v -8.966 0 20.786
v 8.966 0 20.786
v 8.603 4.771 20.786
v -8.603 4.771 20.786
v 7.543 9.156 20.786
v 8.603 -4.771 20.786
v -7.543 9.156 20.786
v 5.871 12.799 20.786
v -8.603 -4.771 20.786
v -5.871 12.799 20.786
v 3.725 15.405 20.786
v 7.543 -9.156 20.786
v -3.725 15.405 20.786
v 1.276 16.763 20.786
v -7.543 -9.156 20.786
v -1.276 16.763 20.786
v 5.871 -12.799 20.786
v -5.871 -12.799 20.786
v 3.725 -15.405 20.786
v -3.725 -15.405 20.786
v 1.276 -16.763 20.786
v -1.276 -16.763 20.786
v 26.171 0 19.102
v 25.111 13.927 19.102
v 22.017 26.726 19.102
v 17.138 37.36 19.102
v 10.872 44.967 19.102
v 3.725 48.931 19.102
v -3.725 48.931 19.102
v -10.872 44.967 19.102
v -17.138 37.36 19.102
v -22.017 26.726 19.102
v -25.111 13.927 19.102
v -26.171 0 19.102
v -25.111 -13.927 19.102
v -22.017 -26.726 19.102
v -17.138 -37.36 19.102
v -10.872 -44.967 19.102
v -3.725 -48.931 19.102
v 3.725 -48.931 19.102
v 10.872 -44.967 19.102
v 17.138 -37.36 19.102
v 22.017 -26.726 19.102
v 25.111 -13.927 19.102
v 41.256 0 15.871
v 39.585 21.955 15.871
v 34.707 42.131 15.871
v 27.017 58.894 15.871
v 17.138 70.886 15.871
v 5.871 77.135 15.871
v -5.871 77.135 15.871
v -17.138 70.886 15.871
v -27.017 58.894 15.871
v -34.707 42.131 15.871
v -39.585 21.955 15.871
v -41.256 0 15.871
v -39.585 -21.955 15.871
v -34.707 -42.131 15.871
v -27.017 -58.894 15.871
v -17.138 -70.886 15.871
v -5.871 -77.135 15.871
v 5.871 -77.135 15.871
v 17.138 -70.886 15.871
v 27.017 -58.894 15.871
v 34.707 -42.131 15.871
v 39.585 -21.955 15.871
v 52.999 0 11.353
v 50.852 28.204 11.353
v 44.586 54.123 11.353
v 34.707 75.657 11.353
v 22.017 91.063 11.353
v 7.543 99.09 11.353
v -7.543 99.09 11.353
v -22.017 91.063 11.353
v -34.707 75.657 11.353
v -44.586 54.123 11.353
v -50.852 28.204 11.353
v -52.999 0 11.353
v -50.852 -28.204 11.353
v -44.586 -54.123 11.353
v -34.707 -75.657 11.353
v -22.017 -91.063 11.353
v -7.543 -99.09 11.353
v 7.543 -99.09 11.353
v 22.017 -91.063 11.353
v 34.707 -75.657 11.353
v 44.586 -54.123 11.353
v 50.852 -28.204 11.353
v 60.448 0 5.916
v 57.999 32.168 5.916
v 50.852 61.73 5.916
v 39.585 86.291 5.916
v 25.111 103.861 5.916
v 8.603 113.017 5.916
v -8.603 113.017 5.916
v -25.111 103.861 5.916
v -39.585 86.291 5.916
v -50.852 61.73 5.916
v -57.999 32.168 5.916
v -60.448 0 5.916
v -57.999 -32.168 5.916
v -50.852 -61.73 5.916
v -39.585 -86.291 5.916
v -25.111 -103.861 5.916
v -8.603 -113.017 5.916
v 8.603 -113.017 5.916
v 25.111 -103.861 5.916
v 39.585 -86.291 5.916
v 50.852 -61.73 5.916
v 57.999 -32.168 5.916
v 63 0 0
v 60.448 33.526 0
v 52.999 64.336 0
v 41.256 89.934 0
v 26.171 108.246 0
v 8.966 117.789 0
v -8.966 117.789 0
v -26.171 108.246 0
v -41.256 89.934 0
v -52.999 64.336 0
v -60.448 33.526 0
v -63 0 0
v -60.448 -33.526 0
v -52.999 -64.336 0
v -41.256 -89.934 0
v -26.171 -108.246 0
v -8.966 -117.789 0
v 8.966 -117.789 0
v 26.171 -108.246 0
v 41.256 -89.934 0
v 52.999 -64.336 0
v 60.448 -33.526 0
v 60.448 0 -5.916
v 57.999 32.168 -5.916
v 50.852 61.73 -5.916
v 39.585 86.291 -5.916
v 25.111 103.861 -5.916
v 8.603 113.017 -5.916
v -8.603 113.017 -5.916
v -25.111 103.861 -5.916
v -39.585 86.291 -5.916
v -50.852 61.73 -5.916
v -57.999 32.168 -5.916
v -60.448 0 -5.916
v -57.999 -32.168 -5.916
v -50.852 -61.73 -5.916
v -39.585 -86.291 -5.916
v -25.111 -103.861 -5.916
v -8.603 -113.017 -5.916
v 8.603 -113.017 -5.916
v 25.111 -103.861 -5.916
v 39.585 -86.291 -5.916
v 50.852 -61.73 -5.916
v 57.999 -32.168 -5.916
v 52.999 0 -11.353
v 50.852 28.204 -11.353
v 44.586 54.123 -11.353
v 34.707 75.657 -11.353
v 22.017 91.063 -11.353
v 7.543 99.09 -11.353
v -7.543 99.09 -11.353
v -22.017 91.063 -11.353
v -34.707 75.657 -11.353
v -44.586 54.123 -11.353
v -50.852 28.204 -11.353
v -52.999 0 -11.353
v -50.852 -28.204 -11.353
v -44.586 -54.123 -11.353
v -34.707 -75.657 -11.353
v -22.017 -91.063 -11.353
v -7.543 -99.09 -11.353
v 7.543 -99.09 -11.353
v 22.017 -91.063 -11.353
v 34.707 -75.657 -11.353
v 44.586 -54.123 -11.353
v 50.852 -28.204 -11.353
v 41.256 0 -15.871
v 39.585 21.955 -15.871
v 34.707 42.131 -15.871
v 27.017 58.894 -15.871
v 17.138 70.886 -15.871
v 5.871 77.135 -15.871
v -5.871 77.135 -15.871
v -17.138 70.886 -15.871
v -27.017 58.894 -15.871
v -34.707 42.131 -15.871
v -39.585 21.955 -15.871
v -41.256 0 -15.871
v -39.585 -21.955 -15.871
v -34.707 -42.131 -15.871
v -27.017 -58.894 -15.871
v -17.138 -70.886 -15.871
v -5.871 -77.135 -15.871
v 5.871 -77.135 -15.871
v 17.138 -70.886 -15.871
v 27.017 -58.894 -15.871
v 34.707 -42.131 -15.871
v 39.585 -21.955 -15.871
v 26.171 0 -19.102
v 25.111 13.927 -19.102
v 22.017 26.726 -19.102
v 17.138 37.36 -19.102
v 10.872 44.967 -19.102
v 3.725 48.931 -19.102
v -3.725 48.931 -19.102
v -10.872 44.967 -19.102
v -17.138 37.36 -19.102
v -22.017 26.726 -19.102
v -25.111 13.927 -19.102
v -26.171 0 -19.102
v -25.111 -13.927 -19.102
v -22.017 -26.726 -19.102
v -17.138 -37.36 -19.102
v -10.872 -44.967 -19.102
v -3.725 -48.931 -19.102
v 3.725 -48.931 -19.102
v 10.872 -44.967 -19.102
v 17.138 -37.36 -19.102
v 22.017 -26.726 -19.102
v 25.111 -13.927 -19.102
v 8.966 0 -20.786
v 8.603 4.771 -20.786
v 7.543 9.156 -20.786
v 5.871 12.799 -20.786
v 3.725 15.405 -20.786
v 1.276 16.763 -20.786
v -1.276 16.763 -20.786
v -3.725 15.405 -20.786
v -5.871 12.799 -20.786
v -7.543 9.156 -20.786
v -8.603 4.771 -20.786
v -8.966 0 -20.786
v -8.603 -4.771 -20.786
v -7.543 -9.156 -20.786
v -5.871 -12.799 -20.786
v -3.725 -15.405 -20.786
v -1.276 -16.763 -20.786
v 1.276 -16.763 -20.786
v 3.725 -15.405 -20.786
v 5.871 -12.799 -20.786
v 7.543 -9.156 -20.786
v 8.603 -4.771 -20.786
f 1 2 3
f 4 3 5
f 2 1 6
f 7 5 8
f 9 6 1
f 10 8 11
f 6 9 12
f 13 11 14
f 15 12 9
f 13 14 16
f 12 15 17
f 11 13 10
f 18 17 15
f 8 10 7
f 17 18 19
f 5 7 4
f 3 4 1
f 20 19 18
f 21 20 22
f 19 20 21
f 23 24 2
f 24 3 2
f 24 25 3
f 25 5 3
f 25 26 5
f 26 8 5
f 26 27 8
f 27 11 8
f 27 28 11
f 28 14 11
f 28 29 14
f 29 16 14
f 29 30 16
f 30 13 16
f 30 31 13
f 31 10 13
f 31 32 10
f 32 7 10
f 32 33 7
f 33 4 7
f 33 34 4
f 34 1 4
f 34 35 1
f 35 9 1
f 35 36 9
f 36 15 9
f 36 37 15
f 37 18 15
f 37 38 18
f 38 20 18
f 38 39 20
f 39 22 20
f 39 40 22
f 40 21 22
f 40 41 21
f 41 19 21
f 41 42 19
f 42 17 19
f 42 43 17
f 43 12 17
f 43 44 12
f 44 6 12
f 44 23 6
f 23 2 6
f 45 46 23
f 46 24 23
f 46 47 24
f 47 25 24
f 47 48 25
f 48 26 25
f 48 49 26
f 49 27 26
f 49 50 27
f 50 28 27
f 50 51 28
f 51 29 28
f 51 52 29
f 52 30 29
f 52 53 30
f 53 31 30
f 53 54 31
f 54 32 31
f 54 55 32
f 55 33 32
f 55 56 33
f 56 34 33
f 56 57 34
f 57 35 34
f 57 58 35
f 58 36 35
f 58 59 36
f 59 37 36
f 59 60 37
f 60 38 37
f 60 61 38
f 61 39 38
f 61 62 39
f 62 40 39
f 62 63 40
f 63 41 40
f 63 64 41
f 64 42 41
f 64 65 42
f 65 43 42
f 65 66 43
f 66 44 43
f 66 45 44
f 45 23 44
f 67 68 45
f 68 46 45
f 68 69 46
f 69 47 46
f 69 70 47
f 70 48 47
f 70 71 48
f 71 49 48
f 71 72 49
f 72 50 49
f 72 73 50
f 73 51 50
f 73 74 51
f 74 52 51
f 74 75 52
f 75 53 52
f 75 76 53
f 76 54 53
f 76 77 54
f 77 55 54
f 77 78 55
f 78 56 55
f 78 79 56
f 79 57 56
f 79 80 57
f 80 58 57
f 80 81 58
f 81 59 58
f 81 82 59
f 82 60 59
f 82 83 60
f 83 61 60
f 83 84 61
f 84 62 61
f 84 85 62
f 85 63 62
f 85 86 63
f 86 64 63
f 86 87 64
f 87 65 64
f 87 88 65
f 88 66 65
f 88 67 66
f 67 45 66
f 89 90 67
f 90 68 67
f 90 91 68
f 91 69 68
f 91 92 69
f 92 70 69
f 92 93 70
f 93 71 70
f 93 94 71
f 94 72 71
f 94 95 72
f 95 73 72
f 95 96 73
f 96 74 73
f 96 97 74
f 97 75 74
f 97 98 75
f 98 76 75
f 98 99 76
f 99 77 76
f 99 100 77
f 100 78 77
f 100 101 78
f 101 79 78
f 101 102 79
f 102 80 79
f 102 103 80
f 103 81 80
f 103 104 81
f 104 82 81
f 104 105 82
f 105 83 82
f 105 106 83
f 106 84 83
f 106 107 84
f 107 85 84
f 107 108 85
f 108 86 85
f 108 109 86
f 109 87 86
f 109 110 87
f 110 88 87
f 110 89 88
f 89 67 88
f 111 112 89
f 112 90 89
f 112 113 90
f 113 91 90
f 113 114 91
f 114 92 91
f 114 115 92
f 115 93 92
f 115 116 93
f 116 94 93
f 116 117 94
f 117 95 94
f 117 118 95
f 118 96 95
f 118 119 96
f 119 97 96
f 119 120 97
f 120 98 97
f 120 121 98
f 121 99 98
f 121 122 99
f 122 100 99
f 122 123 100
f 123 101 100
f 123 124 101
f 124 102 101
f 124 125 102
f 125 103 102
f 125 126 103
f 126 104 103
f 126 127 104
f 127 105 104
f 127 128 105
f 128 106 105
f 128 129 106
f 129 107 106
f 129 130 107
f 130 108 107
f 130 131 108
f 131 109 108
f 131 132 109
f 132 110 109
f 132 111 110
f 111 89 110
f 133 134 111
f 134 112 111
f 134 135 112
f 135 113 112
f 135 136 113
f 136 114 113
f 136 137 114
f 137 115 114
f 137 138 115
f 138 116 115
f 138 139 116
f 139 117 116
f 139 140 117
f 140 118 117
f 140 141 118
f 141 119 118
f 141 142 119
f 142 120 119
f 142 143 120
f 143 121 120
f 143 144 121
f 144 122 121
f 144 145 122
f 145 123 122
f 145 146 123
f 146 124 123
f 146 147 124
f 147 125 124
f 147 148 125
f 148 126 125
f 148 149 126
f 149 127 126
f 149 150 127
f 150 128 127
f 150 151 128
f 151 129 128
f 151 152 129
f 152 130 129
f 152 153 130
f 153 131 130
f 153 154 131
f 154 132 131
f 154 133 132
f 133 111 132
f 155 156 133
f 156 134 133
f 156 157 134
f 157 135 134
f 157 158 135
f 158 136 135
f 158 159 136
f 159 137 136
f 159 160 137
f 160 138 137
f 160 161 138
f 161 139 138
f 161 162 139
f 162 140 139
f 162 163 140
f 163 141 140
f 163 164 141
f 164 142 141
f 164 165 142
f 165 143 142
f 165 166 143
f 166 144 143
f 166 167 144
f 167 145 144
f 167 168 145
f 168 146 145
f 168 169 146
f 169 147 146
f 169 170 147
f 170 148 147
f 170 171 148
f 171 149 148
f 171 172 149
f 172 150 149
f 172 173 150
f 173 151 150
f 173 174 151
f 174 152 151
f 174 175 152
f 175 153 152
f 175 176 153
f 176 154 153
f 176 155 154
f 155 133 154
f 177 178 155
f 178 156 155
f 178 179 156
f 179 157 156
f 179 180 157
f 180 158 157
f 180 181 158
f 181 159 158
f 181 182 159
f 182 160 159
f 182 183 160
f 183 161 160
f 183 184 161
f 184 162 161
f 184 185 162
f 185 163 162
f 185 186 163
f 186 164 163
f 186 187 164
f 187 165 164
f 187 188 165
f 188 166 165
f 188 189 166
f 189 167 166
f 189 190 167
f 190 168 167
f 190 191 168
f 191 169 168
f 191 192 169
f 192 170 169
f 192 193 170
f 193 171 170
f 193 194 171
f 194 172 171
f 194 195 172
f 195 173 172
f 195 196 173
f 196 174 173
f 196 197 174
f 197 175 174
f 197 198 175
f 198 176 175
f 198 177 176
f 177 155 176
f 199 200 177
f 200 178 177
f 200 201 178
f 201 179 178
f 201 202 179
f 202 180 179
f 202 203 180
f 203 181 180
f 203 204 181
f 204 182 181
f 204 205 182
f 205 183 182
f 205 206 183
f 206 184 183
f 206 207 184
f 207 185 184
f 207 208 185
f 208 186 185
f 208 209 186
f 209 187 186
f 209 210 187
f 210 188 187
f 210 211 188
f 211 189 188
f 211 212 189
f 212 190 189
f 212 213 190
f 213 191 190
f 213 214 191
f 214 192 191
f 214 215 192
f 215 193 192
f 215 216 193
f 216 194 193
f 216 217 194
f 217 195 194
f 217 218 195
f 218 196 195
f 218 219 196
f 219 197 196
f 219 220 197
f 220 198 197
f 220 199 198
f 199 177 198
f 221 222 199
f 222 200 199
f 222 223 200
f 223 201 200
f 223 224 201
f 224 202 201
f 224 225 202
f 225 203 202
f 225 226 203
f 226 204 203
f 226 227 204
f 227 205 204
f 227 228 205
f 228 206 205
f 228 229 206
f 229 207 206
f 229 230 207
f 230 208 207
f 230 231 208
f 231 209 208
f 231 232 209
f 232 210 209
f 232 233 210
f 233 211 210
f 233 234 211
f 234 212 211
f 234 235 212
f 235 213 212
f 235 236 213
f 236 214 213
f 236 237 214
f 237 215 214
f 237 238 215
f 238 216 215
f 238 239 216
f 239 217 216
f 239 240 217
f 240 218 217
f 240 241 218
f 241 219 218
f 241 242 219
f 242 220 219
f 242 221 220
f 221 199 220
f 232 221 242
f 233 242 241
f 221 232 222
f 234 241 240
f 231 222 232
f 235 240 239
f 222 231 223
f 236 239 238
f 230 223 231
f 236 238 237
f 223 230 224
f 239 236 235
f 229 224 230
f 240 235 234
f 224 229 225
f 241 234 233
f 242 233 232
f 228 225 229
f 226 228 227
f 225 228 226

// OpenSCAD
// Generated by SolidPython 1.0.1 on 2020-07-29 00:46:49


scale(v = [9, 17, 3]) {
	sphere(r = 7);
}
/***********************************************
*********      SolidPython code:      **********
************************************************
 
# import packages: SolidPython
from solid import *
from solid.utils import *
from itertools import chain, combinations, permutations


class Resize:

    def __init__(self, scad_file):
        self.scad_file = scad_file
        #self.scad_file = import_scad(scad_file)
        # cone/cylinder param:
        self.r1 = 0
        self.r2 = 0
        self.h = 0
        # rectangular prism param:
        self.w = 0
        self.l = 0
        # ellipse param:
        self.r = 0

    # import OpenScad code (file name corresponds to shape)


    # classify shape + parameters
    def assign(self, param1, param2, param3):
        if self.scad_file == 'cone.scad':
            self.r1 = param1
            self.r2 = param2
            self.h = param3
        elif self.scad_file == 'cylinder.scad':
            self.r1 = param1
            self.r2 = param2
            self.h = param3
        elif self.scad_file == 'rectangularPrism.scad':
            self.h = param1
            self.l = param2
            self.w = param3
        else:
            self.r = param1
            self.h = param2

    # resize parameters
    def iterate(self):
        x = range(3, 20, 2)
        i = 1
        if self.scad_file == 'cone.scad':
            tempList = list(permutations(x, 2))
            for temp in tempList:
                param1 = temp[0]
                param2 = temp[1]
                filepath = 'produced_scad_files/' + 'cone' + str(param1) + '_' + str(param2) + '_' + '.scad'
                scad_render_to_file(cylinder(h=param1, r1=param2, r2=0), filepath)

        elif self.scad_file == 'cylinder.scad':
            tempList = list(permutations(x, 3))
            for temp in tempList:
                param1 = temp[0]
                param2 = temp[1]
                filepath = 'produced_scad_files/' + 'cylinder' + str(param1) + '_' + str(param2) + '_' + '.scad'
                scad_render_to_file(cylinder(h=param1, r1=param2, r2=param2), filepath)

        elif self.scad_file == 'rectangularPrism.scad':
            tempList = list(permutations(x, 3))
            for temp in tempList:
                param1 = temp[0]
                param2 = temp[1]
                param3 = temp[2]
                filepath = 'produced_scad_files/' + 'rectangularPrism' + str(param1) + '_' + str(param2) + '_' + str(
                    param3) + '.scad'
                scad_render_to_file(cube(size=(param1, param2, param3)), filepath)

        elif self.scad_file == 'ellipse.scad':
            tempList = list(permutations(x, 4))
            for temp in tempList:
                param1 = temp[0]
                param2 = temp[1]
                param3 = temp[2]
                param4 = temp[3]
                filepath = 'produced_scad_files/' + 'ellipse' + str(param1) + '_' + str(param2) + '_' + str(param3) + '_' + str(param4) + '.scad'
                scad_render_to_file(scale([param1, param2, param3])(sphere(r=param4)), filepath)

    def render_to_scadfile(self):
        scad_render_to_file(scad, 'example.scad') 
 
************************************************/
